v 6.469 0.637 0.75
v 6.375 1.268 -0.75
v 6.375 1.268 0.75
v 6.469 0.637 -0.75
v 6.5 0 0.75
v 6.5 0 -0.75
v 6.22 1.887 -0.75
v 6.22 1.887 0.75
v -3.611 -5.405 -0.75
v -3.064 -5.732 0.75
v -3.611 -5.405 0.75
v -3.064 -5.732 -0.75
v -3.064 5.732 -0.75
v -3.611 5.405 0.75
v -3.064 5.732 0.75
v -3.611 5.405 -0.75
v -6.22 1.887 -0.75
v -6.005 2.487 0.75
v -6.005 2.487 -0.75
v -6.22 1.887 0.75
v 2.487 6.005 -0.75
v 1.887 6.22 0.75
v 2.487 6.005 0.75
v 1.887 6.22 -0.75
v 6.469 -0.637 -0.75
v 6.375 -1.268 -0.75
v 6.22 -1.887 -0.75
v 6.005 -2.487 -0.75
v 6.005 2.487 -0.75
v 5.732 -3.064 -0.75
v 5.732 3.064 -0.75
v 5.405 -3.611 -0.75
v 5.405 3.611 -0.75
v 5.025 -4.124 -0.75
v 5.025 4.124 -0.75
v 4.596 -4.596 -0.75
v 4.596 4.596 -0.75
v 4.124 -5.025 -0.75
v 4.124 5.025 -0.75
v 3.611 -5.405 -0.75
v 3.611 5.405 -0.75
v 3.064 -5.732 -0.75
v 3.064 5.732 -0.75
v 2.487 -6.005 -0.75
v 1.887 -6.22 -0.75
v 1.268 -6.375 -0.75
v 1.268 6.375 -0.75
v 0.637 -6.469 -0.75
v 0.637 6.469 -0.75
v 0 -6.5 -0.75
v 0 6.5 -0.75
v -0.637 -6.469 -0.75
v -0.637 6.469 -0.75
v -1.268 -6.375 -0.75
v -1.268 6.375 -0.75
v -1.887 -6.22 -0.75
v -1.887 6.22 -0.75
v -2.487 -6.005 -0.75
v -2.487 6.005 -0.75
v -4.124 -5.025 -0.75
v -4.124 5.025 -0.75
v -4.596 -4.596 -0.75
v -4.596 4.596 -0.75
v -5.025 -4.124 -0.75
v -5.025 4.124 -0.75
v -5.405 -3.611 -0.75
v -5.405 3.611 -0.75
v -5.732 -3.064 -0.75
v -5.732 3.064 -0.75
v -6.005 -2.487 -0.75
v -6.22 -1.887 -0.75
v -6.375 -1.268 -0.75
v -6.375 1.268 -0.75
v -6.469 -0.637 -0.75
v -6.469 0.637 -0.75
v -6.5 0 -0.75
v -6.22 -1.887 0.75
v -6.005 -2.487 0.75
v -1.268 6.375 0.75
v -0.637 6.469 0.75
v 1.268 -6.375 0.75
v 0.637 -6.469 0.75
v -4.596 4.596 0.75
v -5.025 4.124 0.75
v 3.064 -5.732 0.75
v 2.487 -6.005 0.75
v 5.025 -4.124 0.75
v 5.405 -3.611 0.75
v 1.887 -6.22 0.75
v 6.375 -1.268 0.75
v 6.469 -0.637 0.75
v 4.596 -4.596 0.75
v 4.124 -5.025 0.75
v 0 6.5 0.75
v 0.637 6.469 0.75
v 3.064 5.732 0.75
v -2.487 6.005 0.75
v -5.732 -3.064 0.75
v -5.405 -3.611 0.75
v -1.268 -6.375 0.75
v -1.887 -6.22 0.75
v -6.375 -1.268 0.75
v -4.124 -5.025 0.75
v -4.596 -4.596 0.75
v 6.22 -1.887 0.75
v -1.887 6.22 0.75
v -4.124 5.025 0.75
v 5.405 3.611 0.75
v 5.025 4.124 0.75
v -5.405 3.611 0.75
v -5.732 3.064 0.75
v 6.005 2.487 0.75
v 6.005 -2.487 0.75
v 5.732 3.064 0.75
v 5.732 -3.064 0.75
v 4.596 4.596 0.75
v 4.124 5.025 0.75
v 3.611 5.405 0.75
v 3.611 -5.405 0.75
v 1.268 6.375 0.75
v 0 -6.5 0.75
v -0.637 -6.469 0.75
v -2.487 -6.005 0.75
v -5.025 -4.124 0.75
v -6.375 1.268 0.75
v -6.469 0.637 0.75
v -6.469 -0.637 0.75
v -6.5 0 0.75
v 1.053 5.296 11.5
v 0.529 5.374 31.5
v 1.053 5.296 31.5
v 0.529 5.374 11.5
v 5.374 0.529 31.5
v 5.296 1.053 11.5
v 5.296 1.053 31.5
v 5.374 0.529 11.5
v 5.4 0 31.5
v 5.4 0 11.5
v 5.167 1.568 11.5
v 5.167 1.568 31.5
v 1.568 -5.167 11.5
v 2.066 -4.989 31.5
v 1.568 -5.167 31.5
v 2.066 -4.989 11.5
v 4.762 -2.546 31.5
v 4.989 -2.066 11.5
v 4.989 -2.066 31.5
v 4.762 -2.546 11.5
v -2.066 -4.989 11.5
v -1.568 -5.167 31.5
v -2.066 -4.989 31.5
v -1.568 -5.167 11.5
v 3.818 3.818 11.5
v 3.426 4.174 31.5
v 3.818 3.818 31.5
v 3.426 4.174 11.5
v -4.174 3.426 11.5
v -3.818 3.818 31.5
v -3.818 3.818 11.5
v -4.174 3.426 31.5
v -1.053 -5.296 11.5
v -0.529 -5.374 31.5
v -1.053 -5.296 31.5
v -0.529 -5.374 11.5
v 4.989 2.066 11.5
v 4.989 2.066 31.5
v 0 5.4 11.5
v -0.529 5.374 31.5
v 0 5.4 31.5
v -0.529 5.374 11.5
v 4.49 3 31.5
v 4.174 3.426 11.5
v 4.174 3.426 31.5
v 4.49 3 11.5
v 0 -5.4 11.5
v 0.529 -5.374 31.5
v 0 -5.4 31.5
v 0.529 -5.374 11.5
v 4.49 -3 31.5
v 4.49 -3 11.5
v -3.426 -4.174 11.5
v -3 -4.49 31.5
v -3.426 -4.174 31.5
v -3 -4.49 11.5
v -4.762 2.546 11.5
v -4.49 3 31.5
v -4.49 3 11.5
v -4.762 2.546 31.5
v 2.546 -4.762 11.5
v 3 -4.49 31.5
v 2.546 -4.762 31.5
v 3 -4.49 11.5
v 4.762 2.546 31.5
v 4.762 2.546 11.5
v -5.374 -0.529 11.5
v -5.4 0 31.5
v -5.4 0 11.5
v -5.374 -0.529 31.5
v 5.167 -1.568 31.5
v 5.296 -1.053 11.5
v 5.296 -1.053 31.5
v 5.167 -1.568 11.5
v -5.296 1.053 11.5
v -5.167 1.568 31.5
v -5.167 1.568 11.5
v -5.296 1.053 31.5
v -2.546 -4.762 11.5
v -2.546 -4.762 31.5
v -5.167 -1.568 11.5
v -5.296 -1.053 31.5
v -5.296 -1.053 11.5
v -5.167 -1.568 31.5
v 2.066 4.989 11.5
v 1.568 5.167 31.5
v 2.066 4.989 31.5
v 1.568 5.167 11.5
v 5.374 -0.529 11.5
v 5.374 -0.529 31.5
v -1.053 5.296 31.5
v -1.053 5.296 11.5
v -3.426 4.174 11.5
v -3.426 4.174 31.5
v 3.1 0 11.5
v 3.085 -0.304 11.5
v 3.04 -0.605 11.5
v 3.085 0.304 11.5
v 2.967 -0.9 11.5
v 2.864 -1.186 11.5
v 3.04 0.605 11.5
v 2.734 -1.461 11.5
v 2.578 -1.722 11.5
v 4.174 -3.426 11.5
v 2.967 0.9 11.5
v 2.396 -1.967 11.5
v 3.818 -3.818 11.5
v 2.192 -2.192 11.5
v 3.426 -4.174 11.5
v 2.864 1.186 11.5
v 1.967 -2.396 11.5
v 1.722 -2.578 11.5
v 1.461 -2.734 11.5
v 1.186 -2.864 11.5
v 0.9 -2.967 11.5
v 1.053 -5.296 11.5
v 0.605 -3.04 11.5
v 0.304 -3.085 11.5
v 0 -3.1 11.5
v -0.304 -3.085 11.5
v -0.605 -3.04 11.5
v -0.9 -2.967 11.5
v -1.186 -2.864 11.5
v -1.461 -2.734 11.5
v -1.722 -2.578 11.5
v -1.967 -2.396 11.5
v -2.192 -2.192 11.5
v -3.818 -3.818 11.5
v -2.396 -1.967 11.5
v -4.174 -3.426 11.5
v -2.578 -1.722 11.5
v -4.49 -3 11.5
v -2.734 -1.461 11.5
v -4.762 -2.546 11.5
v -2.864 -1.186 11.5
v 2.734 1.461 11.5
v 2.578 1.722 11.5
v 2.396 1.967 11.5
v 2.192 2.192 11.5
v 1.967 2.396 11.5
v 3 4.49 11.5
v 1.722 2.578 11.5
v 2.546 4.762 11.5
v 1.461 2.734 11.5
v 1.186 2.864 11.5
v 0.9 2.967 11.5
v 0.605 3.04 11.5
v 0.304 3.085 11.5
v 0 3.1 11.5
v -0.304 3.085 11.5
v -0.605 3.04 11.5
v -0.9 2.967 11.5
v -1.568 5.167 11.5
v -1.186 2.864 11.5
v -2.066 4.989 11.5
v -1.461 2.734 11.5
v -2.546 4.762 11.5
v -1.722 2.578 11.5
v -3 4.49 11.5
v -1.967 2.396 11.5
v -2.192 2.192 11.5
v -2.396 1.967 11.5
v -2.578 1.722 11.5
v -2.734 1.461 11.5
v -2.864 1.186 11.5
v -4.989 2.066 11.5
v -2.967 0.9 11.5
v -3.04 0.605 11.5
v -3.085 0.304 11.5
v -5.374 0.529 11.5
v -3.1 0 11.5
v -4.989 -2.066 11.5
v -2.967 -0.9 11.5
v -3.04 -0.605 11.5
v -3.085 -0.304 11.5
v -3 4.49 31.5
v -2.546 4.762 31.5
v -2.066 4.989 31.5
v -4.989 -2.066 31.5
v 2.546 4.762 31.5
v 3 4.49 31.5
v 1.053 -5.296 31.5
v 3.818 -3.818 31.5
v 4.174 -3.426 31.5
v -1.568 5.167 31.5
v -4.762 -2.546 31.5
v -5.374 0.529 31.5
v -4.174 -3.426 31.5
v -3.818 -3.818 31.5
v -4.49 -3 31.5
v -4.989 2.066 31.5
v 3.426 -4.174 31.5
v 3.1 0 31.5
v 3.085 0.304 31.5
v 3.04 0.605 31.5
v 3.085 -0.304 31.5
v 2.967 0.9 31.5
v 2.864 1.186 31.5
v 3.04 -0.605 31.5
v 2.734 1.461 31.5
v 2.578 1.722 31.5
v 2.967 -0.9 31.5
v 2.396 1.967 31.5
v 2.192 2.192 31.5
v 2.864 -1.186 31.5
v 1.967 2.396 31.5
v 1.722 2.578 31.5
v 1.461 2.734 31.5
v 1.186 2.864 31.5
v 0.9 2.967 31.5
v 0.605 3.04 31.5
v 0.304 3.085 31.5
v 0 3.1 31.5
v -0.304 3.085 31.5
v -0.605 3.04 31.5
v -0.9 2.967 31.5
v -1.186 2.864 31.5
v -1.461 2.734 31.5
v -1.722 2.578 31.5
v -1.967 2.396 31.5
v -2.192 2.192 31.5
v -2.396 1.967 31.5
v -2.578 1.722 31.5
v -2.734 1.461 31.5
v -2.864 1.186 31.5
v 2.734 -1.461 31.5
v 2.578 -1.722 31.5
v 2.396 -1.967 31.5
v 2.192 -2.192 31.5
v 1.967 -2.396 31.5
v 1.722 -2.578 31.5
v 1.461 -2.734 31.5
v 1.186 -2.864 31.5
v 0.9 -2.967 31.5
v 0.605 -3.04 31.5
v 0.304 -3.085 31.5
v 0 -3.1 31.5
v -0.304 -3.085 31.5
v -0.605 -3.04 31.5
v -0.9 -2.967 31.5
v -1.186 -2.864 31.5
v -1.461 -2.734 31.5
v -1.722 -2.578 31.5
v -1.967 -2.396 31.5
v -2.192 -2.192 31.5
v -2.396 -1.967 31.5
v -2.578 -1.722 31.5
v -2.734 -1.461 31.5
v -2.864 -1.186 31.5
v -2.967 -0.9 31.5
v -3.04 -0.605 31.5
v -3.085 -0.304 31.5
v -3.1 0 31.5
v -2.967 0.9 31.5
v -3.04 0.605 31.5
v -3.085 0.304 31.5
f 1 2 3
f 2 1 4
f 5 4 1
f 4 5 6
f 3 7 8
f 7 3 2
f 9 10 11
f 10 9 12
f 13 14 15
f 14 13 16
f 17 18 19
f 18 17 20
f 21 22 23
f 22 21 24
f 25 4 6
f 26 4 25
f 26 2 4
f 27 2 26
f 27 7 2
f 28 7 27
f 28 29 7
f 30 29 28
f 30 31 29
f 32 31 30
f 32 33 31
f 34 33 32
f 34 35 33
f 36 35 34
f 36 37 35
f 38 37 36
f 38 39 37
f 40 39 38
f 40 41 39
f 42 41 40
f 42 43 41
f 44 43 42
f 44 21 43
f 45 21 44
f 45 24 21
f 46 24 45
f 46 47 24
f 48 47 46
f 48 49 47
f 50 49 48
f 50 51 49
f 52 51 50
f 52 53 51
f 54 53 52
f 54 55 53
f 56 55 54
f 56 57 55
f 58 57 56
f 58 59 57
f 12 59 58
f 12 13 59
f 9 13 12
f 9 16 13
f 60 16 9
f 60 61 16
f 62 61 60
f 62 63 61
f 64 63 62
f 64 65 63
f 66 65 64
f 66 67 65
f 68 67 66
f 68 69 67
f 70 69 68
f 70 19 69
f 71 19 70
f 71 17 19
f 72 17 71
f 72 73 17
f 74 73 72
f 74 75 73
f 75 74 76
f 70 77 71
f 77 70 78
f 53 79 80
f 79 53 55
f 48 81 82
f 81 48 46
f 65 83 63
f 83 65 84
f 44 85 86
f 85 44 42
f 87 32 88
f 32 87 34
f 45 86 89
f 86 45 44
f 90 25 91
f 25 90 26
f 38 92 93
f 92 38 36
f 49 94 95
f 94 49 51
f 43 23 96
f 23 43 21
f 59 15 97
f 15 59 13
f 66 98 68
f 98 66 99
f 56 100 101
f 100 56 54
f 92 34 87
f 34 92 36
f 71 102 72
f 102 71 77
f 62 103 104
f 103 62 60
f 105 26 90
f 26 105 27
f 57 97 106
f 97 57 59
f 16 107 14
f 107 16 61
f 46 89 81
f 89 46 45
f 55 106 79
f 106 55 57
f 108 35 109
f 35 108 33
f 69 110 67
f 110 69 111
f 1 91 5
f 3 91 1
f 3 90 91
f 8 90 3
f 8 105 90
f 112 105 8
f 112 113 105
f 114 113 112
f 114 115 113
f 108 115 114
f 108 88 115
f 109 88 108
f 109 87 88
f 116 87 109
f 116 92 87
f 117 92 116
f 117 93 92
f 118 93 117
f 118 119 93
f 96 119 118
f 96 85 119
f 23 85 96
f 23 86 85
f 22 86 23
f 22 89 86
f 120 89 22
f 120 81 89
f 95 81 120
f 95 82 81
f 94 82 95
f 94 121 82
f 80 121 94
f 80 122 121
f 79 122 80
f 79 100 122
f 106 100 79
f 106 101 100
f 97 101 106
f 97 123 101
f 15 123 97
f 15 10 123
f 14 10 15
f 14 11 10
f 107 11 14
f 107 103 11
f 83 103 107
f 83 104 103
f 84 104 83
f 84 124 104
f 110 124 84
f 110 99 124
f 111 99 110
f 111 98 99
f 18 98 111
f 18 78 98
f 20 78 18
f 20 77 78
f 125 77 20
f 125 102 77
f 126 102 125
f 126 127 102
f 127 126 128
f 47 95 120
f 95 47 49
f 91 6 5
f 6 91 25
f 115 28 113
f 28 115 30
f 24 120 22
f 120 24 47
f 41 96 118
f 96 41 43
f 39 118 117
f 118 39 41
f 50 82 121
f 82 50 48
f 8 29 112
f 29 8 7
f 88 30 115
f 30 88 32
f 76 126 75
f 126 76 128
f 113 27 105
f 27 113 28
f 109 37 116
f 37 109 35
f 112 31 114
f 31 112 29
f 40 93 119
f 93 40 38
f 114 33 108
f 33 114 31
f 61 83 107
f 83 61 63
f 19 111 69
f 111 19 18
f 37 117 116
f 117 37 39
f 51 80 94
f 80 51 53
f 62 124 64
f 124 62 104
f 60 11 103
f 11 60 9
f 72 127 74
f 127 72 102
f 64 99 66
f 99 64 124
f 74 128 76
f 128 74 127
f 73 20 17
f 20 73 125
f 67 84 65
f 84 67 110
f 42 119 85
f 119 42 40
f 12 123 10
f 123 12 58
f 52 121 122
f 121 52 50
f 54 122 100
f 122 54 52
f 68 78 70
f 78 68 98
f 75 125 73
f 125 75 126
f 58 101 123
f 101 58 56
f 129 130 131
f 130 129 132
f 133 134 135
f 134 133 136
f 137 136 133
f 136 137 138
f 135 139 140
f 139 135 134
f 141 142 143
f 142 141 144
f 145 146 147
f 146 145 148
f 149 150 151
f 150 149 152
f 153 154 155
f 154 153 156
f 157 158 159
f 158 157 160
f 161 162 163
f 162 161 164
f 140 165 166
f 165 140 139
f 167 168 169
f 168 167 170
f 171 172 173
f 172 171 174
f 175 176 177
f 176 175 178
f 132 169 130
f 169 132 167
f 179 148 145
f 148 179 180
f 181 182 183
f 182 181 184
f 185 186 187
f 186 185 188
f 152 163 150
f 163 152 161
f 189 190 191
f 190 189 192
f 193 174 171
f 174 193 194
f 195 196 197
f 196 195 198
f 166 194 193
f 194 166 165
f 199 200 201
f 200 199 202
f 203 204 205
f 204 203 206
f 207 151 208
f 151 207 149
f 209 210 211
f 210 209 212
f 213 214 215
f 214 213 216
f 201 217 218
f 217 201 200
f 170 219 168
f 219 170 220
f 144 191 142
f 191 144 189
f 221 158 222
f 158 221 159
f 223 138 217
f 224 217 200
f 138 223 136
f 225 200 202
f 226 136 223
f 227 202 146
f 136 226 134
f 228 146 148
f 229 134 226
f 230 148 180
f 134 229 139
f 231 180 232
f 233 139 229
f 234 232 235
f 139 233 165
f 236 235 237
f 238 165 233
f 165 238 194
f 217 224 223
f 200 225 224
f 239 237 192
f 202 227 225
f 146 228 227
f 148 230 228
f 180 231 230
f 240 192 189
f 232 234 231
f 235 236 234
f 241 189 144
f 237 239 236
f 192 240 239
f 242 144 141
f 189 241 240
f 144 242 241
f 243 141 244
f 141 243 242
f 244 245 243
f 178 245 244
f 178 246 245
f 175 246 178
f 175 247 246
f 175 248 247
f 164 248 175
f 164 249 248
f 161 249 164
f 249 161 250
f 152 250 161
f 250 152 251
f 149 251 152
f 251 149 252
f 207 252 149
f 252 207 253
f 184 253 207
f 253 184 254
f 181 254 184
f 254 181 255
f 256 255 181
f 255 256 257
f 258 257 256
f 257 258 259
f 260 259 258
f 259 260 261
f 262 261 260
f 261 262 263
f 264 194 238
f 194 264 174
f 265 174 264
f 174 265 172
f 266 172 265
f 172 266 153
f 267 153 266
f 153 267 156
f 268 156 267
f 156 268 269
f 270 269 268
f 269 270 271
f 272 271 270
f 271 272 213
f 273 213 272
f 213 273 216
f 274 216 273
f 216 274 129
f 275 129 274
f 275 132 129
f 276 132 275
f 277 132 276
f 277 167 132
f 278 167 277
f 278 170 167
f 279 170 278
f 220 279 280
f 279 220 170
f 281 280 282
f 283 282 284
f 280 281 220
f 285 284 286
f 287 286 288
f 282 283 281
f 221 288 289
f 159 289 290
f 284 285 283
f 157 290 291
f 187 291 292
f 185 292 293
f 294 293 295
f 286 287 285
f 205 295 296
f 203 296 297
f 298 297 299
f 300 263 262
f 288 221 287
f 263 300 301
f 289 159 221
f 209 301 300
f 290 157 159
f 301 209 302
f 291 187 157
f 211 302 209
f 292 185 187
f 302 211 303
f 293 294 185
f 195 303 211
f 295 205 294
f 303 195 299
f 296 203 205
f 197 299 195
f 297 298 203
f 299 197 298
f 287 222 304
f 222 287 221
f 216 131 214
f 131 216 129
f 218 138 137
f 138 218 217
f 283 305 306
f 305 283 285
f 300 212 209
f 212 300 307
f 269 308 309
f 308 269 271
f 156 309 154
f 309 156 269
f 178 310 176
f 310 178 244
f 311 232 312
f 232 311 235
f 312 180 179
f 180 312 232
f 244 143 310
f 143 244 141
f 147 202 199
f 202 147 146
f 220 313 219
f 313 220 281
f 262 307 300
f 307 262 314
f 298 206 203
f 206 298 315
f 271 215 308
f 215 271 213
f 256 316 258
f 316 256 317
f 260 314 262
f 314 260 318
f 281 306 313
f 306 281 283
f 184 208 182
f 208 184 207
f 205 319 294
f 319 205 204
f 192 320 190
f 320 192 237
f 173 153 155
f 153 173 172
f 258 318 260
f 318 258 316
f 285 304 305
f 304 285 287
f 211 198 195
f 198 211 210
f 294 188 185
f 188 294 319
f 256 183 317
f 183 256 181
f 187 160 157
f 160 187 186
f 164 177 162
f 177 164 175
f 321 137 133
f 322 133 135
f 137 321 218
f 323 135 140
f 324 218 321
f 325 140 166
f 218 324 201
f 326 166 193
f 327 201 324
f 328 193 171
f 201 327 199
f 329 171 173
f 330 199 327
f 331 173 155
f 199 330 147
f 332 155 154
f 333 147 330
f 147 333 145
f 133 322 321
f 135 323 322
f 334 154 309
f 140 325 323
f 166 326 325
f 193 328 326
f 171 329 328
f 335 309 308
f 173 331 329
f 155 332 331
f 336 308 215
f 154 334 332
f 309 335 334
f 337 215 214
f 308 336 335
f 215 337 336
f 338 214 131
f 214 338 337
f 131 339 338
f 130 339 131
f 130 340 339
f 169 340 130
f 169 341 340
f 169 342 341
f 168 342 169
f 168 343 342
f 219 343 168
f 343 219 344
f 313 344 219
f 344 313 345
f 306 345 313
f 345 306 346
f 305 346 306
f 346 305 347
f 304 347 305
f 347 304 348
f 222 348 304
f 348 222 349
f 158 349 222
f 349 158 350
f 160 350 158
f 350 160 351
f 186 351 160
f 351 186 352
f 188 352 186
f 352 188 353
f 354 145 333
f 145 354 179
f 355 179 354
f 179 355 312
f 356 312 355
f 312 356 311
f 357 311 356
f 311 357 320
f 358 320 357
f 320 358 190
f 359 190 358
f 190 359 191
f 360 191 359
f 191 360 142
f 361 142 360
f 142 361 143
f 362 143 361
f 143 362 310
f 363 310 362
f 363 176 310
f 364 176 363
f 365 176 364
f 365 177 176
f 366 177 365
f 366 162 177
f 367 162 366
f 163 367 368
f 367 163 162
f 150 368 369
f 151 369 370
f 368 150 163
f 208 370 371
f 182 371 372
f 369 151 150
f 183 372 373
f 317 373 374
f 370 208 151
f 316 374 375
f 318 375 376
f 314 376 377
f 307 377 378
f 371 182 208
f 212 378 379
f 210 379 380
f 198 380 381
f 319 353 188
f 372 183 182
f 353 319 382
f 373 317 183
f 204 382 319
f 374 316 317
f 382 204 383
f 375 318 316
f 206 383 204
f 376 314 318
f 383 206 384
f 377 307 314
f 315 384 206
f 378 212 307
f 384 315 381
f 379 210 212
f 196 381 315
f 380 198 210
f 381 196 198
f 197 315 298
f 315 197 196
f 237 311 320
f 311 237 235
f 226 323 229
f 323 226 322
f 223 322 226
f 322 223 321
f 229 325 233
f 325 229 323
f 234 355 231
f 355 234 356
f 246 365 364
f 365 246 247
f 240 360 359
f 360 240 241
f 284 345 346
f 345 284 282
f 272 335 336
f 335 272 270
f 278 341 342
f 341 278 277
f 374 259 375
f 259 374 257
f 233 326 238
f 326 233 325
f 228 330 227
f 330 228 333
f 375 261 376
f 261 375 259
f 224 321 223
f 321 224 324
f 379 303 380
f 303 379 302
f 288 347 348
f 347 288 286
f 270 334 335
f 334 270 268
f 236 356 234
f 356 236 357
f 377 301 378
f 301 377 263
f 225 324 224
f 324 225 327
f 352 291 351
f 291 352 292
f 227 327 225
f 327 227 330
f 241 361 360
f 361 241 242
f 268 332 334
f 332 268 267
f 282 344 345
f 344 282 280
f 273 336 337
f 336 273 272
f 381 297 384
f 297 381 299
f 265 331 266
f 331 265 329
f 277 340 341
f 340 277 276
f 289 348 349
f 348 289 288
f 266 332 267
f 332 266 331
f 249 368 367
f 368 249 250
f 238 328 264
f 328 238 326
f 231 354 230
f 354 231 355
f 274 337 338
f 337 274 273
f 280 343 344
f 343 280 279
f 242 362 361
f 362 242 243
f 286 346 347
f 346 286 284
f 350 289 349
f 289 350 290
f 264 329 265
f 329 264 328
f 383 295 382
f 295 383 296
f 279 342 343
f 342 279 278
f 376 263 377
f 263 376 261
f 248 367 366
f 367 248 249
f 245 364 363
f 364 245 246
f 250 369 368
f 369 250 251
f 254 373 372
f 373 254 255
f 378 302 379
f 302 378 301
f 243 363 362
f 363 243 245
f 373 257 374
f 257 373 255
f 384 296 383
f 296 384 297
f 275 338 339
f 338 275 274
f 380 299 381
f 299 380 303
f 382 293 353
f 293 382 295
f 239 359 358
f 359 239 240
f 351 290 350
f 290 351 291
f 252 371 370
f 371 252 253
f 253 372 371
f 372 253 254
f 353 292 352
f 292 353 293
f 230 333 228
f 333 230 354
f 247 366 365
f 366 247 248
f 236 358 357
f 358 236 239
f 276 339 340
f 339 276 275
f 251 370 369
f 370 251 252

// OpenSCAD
// Adapter sleeve for 0.2 mL PCR tube in 1.5 mL rack
// Print orientation: Collar on bed (Z=0), Sleeve body rising up.

// --- Dimensions (mm) ---
// Collar dimensions (lying on bed)
$collar_diameter = 13;
$collar_thickness = 1.5;

// Sleeve body dimensions (rising from collar)
// Outer diameter of the sleeve body
$sleeve_outer_diameter = 10.8;
// Total height of the part (Collar + Body)
$total_height = 21.5;

// Bore dimensions
$bore_diameter = 6.2;

// --- Configuration ---
$fn = 64; // High resolution for smooth holes and cylinders

module adapter_sleeve() {
    // Calculate derived heights
    $collar_height = $collar_thickness;
    $sleeve_body_height = $total_height - $collar_height;
    
    // Calculate radii
    $collar_radius = $collar_diameter / 2;
    $sleeve_outer_radius = $sleeve_outer_diameter / 2;
    $bore_radius = $bore_diameter / 2;
    
    // Center of the part is at (0,0,0)
    // The collar sits from z=0 to z=$collar_height
    // The sleeve body sits from z=$collar_height to z=$total_height
    
    difference() {
        // --- Main Body (Union of Collar and Sleeve) ---
        union() {
            // 1. The Collar (Lying on the bed)
            // Cylinder centered at (0,0, $collar_height/2)
            cylinder(
                h = $collar_height,
                r = $collar_radius,
                center = true
            );
            
            // 2. The Sleeve Body (Rising from the collar)
            // Cylinder centered at (0,0, $collar_height + $sleeve_body_height/2)
            translate([0, 0, $collar_height + $sleeve_body_height/2]) {
                cylinder(
                    h = $sleeve_body_height,
                    r = $sleeve_outer_radius,
                    $fn = $fn
                );
            }
        }
        
        // --- Bore (Hole through the center) ---
        // The hole runs through the full height ($total_height)
        // Centered at (0,0, $total_height/2)
        translate([0, 0, $total_height/2]) {
            cylinder(
                h = $total_height,
                r = $bore_radius,
                $fn = $fn
            );
        }
    }
}

// Render the part
adapter_sleeve();
